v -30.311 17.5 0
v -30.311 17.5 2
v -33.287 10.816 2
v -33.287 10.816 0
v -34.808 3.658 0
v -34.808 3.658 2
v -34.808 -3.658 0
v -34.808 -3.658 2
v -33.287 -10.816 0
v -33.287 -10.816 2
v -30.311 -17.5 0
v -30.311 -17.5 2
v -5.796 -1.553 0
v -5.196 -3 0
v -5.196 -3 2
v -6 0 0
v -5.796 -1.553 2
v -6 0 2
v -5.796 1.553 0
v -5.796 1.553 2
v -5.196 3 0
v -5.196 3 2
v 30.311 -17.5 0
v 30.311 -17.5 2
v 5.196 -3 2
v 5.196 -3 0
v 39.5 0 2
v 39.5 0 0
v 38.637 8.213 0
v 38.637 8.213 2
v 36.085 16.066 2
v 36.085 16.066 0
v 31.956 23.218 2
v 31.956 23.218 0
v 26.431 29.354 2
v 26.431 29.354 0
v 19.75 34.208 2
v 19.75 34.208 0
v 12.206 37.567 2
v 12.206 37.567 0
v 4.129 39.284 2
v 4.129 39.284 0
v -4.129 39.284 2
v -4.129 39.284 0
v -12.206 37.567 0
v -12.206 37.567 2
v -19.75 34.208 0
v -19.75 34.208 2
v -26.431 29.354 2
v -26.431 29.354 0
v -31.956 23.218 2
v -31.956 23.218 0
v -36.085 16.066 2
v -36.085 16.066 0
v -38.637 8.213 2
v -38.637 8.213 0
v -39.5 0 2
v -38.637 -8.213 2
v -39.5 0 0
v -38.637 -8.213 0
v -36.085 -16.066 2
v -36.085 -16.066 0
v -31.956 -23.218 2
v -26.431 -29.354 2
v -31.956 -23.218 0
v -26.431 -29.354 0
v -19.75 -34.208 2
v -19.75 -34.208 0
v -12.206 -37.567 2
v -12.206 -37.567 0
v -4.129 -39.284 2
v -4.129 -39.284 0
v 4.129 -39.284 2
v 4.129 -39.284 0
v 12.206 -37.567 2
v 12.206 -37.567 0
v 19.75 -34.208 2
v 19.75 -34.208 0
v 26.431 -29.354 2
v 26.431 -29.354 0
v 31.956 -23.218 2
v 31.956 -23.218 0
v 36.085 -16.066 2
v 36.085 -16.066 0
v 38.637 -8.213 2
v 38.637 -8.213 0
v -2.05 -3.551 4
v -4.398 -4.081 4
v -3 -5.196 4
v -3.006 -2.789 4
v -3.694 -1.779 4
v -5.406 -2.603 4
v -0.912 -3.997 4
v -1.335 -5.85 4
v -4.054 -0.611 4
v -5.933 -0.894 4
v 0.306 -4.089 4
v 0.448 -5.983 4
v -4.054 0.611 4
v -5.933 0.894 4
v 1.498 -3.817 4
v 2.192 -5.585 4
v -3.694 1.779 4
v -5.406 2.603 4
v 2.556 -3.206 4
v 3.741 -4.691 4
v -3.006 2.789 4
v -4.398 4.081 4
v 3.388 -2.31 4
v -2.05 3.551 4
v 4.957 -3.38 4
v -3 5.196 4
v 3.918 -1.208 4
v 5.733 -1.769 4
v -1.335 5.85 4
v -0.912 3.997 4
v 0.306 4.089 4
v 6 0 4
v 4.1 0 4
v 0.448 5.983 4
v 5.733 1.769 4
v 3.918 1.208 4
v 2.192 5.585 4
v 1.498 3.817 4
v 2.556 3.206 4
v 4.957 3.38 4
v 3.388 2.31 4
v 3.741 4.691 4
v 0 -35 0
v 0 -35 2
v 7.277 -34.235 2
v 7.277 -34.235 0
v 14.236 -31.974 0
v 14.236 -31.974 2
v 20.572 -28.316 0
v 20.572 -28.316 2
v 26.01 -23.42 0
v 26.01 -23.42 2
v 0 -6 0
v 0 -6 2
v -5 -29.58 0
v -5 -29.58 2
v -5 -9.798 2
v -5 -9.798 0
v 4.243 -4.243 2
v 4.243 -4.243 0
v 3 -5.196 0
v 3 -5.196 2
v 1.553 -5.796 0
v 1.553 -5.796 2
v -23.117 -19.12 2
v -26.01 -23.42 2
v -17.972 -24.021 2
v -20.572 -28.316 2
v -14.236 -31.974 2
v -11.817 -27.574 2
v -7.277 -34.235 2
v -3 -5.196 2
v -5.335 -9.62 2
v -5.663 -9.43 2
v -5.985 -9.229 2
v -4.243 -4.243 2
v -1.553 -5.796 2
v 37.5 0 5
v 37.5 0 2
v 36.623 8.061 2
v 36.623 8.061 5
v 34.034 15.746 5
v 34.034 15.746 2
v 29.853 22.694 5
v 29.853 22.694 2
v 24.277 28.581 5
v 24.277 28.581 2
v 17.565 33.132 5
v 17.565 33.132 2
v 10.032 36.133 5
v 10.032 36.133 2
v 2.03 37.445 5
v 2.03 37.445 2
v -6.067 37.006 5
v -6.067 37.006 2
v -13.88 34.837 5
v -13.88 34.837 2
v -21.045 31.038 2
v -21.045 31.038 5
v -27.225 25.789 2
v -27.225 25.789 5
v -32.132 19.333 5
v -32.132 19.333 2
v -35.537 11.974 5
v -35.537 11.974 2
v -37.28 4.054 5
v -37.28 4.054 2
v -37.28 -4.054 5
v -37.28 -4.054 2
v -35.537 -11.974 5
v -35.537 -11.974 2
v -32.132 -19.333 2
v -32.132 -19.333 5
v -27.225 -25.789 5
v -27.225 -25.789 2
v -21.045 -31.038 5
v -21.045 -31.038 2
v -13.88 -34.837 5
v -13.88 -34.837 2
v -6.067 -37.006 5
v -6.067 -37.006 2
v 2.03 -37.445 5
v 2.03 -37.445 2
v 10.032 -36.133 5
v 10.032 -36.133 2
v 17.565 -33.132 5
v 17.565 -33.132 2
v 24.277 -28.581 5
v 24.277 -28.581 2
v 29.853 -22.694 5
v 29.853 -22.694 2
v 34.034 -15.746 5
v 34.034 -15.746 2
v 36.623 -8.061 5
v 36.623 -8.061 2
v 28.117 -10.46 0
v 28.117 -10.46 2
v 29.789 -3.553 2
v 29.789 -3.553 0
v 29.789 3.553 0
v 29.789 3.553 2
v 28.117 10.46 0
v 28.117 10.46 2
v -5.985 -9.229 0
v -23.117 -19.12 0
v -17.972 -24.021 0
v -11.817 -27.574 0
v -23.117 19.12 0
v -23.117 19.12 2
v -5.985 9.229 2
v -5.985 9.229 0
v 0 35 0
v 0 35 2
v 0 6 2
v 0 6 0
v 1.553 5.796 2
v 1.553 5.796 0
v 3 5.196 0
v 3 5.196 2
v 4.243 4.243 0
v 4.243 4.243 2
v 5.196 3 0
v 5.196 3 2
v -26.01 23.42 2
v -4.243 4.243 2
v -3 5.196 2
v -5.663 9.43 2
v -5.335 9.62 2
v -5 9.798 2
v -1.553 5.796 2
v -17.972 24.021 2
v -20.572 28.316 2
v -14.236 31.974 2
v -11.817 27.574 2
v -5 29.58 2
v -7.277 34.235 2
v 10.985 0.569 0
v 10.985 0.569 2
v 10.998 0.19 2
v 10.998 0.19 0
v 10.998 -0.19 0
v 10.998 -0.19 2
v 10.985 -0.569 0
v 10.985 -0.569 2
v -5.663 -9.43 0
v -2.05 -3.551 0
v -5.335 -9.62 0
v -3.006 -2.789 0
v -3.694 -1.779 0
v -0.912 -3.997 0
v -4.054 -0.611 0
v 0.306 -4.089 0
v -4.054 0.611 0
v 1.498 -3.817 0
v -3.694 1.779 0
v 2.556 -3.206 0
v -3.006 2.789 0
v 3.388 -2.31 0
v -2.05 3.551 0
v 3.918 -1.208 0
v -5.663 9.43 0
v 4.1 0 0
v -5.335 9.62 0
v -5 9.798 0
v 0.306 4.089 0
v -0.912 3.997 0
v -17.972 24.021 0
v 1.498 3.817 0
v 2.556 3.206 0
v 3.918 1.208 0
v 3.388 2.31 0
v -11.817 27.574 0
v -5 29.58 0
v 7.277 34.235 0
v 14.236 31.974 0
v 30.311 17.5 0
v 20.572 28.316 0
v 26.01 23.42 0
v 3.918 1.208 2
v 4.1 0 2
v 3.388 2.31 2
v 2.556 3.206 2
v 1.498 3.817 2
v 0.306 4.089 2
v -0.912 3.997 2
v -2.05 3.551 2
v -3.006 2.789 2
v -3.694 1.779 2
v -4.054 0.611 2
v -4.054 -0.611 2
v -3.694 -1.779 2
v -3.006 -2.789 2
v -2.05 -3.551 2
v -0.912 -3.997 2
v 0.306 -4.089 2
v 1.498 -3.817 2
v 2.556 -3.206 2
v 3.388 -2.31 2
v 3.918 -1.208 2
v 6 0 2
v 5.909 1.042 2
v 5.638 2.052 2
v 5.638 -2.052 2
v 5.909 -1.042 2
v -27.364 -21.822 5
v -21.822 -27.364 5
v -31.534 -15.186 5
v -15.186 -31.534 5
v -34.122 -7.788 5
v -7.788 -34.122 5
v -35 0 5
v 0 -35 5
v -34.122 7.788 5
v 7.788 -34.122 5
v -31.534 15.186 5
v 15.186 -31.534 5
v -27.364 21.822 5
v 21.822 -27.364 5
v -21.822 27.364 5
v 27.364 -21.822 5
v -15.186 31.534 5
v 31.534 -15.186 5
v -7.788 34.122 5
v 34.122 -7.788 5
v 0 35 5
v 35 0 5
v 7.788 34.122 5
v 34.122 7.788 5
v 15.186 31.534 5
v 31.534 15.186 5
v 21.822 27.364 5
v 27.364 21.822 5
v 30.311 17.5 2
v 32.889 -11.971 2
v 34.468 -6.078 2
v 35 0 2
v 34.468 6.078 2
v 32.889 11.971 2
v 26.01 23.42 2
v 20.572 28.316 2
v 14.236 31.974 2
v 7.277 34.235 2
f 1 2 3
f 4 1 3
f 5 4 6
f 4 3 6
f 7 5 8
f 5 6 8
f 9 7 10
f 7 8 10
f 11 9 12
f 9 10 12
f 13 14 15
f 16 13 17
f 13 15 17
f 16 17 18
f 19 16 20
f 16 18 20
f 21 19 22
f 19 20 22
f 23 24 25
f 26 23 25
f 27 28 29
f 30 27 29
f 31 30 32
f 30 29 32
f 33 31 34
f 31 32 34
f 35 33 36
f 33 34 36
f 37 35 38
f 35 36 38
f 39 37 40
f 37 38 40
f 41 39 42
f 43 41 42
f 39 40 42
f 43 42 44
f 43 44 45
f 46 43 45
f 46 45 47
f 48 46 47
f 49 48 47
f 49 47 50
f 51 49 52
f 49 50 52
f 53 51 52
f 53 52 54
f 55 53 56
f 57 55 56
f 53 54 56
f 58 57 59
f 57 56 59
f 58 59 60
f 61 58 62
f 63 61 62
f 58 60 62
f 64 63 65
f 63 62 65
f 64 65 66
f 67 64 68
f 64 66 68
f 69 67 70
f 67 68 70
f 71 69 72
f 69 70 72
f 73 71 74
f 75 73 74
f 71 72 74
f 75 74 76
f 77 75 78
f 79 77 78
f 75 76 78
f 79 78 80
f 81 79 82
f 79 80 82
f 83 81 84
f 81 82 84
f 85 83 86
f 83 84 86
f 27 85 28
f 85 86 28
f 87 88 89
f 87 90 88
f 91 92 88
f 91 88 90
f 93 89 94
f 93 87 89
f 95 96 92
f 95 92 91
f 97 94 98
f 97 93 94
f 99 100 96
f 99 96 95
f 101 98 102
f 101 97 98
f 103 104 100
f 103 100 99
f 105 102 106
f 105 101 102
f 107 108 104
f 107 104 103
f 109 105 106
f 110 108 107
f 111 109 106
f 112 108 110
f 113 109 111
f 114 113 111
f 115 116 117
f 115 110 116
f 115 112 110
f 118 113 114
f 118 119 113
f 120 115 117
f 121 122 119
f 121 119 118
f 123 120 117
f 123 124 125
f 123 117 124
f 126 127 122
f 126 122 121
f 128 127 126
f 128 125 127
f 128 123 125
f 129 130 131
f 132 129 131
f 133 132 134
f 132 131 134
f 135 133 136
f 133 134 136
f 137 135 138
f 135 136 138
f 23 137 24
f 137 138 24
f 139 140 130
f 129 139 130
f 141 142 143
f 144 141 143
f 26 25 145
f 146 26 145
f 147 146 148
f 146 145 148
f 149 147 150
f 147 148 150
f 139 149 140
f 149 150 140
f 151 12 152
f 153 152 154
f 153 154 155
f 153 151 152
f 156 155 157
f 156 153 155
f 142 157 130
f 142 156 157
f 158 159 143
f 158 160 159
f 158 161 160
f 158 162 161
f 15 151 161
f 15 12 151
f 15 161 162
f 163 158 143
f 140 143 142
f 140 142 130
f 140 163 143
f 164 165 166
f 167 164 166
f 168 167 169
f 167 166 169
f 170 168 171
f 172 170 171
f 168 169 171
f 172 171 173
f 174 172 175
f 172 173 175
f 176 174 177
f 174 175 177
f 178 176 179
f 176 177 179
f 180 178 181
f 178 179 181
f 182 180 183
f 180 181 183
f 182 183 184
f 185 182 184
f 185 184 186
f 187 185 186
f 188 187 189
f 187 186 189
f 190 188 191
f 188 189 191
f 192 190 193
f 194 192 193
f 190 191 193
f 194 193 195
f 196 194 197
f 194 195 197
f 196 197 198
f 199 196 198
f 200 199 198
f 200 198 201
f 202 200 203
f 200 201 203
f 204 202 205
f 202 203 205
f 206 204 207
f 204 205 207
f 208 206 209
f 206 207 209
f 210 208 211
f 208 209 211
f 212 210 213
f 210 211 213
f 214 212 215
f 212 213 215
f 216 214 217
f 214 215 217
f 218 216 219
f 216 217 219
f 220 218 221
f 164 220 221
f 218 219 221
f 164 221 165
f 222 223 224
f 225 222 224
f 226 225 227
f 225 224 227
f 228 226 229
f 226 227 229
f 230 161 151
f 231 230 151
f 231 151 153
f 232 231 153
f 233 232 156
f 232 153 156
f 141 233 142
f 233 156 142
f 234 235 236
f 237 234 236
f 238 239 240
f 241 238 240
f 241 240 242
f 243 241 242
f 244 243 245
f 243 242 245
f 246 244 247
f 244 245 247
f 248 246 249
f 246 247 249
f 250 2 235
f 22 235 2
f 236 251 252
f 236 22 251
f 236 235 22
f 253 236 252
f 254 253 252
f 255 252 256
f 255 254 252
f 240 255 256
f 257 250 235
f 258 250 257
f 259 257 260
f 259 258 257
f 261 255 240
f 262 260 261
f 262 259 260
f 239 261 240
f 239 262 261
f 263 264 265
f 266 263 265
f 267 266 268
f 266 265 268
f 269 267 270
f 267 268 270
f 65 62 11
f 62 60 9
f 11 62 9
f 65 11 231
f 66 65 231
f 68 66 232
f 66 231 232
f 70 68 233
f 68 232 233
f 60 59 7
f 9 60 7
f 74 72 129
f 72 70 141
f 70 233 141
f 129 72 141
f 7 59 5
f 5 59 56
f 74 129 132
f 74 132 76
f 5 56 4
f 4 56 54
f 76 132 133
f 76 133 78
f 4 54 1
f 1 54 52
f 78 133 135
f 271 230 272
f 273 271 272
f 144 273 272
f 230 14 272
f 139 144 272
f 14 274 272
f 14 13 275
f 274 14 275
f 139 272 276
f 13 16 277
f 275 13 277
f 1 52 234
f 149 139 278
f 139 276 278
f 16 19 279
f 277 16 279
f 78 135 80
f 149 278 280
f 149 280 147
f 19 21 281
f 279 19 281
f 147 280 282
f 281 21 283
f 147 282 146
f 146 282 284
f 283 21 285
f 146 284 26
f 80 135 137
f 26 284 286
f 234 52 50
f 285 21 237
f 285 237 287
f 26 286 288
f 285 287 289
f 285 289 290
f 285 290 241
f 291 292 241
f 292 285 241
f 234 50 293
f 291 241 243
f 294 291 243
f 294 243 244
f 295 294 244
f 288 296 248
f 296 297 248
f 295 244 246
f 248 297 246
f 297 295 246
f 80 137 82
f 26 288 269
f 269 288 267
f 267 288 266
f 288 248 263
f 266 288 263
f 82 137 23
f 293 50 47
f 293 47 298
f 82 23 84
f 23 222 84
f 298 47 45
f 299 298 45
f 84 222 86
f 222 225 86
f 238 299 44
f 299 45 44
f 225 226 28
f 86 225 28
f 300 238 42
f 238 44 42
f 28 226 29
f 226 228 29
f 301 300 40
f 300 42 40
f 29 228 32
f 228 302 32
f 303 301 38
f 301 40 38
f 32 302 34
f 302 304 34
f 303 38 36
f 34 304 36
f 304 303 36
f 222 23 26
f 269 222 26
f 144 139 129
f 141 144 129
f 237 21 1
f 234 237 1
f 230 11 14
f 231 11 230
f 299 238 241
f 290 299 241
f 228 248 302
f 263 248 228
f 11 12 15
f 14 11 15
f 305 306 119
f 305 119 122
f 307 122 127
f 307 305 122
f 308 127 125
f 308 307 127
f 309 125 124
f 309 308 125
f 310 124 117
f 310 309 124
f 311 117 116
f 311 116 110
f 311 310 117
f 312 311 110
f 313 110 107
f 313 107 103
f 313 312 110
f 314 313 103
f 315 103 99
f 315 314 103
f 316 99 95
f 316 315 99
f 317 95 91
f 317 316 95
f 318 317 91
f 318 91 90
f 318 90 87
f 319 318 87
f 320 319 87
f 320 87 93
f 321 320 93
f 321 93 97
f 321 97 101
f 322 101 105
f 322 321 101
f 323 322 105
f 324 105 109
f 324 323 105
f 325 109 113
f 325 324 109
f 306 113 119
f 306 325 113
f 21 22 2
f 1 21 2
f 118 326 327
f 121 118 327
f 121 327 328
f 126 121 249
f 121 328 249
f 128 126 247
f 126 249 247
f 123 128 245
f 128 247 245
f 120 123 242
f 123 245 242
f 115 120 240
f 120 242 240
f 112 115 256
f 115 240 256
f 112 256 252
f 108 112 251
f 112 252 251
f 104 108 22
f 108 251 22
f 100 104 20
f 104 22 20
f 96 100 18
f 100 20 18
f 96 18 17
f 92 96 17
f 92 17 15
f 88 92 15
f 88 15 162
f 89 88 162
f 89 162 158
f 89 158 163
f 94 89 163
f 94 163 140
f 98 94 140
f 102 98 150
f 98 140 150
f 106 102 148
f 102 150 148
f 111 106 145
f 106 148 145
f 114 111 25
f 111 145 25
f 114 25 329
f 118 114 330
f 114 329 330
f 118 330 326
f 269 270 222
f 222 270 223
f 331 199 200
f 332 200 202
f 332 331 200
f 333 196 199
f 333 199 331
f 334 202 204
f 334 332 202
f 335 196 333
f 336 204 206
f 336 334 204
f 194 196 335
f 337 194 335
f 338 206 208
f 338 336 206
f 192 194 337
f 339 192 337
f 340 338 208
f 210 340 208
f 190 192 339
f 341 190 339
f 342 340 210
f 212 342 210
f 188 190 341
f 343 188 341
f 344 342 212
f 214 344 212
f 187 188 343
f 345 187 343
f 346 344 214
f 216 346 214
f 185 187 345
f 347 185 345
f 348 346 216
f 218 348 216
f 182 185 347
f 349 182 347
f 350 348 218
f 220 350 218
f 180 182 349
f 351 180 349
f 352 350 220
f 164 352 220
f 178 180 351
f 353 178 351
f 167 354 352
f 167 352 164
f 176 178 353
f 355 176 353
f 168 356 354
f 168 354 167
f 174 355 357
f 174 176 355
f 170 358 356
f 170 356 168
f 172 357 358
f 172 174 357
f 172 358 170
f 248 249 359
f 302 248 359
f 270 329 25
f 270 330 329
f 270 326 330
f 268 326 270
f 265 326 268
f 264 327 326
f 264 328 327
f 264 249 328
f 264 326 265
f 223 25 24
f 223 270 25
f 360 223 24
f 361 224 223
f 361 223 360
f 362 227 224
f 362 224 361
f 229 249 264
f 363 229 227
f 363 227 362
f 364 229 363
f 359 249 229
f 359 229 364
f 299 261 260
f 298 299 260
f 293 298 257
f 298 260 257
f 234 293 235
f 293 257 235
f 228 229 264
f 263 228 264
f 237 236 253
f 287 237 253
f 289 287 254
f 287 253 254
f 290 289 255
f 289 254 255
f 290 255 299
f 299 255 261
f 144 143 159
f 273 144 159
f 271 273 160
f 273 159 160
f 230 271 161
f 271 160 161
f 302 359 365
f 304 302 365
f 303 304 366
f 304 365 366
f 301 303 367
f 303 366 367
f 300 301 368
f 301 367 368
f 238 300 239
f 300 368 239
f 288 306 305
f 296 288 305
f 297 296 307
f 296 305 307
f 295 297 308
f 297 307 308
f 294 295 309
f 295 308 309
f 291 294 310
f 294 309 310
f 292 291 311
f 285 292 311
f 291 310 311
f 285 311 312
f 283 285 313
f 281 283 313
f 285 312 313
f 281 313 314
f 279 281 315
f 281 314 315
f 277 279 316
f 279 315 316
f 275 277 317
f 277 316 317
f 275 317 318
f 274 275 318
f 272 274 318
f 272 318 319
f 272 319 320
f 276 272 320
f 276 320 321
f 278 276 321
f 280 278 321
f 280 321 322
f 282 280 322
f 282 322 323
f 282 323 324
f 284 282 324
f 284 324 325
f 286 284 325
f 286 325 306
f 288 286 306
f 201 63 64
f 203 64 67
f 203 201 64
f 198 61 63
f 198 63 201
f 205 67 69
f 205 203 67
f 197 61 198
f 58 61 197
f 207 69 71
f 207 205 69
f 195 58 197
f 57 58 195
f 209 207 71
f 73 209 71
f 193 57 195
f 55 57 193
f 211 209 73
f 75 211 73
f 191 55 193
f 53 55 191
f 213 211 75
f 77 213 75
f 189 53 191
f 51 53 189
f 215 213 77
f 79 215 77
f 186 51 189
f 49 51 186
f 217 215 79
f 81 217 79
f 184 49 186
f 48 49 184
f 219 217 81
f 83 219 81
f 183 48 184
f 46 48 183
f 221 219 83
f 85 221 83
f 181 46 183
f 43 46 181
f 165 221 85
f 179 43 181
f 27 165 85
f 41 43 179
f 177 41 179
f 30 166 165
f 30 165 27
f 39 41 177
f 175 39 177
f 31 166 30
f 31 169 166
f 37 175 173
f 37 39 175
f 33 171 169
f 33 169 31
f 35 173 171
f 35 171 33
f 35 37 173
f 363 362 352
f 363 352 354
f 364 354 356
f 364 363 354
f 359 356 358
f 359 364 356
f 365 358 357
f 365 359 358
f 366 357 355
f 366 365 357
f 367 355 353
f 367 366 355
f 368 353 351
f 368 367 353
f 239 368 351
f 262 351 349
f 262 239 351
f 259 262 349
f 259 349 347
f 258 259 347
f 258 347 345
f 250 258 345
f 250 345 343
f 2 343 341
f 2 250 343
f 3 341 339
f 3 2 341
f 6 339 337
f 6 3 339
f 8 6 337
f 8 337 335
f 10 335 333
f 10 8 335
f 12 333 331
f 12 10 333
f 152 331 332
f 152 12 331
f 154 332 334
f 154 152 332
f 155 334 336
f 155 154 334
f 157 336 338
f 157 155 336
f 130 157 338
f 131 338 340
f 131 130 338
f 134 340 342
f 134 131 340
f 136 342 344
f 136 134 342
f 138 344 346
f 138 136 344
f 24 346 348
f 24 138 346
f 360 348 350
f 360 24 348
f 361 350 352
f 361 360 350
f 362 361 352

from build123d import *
from build123d import SkipClean  # not in build123d's __all__

# Parameters (mm, degrees)
F0_R      = 39.5
F1_DEPTH  = 2
F2_R      = 37.5
F2_R_2    = 35
F3_DEPTH  = 3
F4_R      = 4.1
F5_DEPTH  = 25
F6_R      = 6
F6_R_2    = 4.1
F7_DEPTH  = 2
F9_DEPTH  = 25
F11_DEPTH = 25


# Not quite as in the source:
# - after a boolean that leaves OpenCascade's solid faulty, fix() repairs it


with BuildPart() as f1:
    # F0 (on Top) → F1 (new body)
    with BuildSketch(Plane.XY):
        Circle(F0_R)
    extrude(amount=F1_DEPTH)

    # F2 (on face) → F3 (join)
    with BuildSketch(Plane.XY.offset(2)):
        Circle(F2_R)
        Circle(F2_R_2, mode=Mode.SUBTRACT)
    extrude(amount=F3_DEPTH)

    # F4 (on face) → F5 (cut)
    with BuildSketch(Plane.XY.offset(2)):
        Circle(F4_R)
    extrude(amount=-F5_DEPTH, mode=Mode.SUBTRACT)

    # F6 (on face) → F7 (join)
    with BuildSketch(Plane.XY.offset(2)):
        Circle(F6_R)
        Circle(F6_R_2, mode=Mode.SUBTRACT)
    extrude(amount=F7_DEPTH)

    # F8 (on face) → F9 (cut)
    with BuildSketch(Plane.XY.offset(2)):
        with BuildLine():
            Line((30.3108891325, 17.5), (0, 35))
            Line((0, 35), (0, 6))
            ThreePointArc((0, 6), (3, 5.1961524227), (5.1961524227, 3))
            Line((5.1961524227, 3), (30.3108891325, 17.5))
        make_face()
        with BuildLine():
            Line((0, -35), (30.3108891325, -17.5))
            Line((30.3108891325, -17.5), (5.1961524227, -3))
            ThreePointArc((5.1961524227, -3), (3, -5.1961524227), (0, -6))
            Line((0, -6), (0, -35))
        make_face()
        with BuildLine():
            ThreePointArc((30.3108891325, 17.5), (17.5, 30.3108891325), (0, 35))
            Line((0, 35), (30.3108891325, 17.5))
        make_face()
        with BuildLine():
            ThreePointArc((0, -35), (17.5, -30.3108891325), (30.3108891325, -17.5))
            Line((30.3108891325, -17.5), (0, -35))
        make_face()
        with BuildLine():
            Line((-5.1961524227, 3), (-30.3108891325, 17.5))
            Line((-30.3108891325, 17.5), (-30.3108891325, -17.5))
            Line((-30.3108891325, -17.5), (-5.1961524227, -3))
            ThreePointArc((-5.1961524227, -3), (-6, 0), (-5.1961524227, 3))
        make_face()
        with BuildLine():
            Line((-30.3108891325, -17.5), (-30.3108891325, 17.5))
            ThreePointArc((-30.3108891325, 17.5), (-35, 0), (-30.3108891325, -17.5))
        make_face()
    with SkipClean():  # cleaning this boolean's faces spoils the solid; the shape is the same uncleaned
        extrude(amount=-F9_DEPTH, mode=Mode.SUBTRACT)

    # F10 (on face) → F11 (cut)
    with BuildSketch(Plane.XY.offset(2)):
        with BuildLine():
            Line((-5, 9.7979589711), (-5, 29.5803989155))
            ThreePointArc((-5, 29.5803989155), (-15, 25.9807621135), (-23.1173769149, 19.1203264767))
            Line((-23.1173769149, 19.1203264767), (-5.9852813742, 9.2291065045))
            ThreePointArc((-5.9852813742, 9.2291065045), (-5.5, 9.5262794416), (-5, 9.7979589711))
        make_face()
        with BuildLine():
            ThreePointArc((10.9852813742, 0.5688524666), (11, 0), (10.9852813742, -0.5688524666))
            Line((10.9852813742, -0.5688524666), (28.1173769149, -10.4600724388))
            ThreePointArc((28.1173769149, -10.4600724388), (30, 0), (28.1173769149, 10.4600724388))
            Line((28.1173769149, 10.4600724388), (10.9852813742, 0.5688524666))
        make_face()
        with BuildLine():
            ThreePointArc((-5, -9.7979589711), (-5.5, -9.5262794416), (-5.9852813742, -9.2291065045))
            Line((-5.9852813742, -9.2291065045), (-23.1173769149, -19.1203264767))
            ThreePointArc((-23.1173769149, -19.1203264767), (-15, -25.9807621135), (-5, -29.5803989155))
            Line((-5, -29.5803989155), (-5, -9.7979589711))
        make_face()
    extrude(amount=-F11_DEPTH, mode=Mode.SUBTRACT)

    add(f1.part.fix(), mode=Mode.REPLACE)


solid = f1.part
